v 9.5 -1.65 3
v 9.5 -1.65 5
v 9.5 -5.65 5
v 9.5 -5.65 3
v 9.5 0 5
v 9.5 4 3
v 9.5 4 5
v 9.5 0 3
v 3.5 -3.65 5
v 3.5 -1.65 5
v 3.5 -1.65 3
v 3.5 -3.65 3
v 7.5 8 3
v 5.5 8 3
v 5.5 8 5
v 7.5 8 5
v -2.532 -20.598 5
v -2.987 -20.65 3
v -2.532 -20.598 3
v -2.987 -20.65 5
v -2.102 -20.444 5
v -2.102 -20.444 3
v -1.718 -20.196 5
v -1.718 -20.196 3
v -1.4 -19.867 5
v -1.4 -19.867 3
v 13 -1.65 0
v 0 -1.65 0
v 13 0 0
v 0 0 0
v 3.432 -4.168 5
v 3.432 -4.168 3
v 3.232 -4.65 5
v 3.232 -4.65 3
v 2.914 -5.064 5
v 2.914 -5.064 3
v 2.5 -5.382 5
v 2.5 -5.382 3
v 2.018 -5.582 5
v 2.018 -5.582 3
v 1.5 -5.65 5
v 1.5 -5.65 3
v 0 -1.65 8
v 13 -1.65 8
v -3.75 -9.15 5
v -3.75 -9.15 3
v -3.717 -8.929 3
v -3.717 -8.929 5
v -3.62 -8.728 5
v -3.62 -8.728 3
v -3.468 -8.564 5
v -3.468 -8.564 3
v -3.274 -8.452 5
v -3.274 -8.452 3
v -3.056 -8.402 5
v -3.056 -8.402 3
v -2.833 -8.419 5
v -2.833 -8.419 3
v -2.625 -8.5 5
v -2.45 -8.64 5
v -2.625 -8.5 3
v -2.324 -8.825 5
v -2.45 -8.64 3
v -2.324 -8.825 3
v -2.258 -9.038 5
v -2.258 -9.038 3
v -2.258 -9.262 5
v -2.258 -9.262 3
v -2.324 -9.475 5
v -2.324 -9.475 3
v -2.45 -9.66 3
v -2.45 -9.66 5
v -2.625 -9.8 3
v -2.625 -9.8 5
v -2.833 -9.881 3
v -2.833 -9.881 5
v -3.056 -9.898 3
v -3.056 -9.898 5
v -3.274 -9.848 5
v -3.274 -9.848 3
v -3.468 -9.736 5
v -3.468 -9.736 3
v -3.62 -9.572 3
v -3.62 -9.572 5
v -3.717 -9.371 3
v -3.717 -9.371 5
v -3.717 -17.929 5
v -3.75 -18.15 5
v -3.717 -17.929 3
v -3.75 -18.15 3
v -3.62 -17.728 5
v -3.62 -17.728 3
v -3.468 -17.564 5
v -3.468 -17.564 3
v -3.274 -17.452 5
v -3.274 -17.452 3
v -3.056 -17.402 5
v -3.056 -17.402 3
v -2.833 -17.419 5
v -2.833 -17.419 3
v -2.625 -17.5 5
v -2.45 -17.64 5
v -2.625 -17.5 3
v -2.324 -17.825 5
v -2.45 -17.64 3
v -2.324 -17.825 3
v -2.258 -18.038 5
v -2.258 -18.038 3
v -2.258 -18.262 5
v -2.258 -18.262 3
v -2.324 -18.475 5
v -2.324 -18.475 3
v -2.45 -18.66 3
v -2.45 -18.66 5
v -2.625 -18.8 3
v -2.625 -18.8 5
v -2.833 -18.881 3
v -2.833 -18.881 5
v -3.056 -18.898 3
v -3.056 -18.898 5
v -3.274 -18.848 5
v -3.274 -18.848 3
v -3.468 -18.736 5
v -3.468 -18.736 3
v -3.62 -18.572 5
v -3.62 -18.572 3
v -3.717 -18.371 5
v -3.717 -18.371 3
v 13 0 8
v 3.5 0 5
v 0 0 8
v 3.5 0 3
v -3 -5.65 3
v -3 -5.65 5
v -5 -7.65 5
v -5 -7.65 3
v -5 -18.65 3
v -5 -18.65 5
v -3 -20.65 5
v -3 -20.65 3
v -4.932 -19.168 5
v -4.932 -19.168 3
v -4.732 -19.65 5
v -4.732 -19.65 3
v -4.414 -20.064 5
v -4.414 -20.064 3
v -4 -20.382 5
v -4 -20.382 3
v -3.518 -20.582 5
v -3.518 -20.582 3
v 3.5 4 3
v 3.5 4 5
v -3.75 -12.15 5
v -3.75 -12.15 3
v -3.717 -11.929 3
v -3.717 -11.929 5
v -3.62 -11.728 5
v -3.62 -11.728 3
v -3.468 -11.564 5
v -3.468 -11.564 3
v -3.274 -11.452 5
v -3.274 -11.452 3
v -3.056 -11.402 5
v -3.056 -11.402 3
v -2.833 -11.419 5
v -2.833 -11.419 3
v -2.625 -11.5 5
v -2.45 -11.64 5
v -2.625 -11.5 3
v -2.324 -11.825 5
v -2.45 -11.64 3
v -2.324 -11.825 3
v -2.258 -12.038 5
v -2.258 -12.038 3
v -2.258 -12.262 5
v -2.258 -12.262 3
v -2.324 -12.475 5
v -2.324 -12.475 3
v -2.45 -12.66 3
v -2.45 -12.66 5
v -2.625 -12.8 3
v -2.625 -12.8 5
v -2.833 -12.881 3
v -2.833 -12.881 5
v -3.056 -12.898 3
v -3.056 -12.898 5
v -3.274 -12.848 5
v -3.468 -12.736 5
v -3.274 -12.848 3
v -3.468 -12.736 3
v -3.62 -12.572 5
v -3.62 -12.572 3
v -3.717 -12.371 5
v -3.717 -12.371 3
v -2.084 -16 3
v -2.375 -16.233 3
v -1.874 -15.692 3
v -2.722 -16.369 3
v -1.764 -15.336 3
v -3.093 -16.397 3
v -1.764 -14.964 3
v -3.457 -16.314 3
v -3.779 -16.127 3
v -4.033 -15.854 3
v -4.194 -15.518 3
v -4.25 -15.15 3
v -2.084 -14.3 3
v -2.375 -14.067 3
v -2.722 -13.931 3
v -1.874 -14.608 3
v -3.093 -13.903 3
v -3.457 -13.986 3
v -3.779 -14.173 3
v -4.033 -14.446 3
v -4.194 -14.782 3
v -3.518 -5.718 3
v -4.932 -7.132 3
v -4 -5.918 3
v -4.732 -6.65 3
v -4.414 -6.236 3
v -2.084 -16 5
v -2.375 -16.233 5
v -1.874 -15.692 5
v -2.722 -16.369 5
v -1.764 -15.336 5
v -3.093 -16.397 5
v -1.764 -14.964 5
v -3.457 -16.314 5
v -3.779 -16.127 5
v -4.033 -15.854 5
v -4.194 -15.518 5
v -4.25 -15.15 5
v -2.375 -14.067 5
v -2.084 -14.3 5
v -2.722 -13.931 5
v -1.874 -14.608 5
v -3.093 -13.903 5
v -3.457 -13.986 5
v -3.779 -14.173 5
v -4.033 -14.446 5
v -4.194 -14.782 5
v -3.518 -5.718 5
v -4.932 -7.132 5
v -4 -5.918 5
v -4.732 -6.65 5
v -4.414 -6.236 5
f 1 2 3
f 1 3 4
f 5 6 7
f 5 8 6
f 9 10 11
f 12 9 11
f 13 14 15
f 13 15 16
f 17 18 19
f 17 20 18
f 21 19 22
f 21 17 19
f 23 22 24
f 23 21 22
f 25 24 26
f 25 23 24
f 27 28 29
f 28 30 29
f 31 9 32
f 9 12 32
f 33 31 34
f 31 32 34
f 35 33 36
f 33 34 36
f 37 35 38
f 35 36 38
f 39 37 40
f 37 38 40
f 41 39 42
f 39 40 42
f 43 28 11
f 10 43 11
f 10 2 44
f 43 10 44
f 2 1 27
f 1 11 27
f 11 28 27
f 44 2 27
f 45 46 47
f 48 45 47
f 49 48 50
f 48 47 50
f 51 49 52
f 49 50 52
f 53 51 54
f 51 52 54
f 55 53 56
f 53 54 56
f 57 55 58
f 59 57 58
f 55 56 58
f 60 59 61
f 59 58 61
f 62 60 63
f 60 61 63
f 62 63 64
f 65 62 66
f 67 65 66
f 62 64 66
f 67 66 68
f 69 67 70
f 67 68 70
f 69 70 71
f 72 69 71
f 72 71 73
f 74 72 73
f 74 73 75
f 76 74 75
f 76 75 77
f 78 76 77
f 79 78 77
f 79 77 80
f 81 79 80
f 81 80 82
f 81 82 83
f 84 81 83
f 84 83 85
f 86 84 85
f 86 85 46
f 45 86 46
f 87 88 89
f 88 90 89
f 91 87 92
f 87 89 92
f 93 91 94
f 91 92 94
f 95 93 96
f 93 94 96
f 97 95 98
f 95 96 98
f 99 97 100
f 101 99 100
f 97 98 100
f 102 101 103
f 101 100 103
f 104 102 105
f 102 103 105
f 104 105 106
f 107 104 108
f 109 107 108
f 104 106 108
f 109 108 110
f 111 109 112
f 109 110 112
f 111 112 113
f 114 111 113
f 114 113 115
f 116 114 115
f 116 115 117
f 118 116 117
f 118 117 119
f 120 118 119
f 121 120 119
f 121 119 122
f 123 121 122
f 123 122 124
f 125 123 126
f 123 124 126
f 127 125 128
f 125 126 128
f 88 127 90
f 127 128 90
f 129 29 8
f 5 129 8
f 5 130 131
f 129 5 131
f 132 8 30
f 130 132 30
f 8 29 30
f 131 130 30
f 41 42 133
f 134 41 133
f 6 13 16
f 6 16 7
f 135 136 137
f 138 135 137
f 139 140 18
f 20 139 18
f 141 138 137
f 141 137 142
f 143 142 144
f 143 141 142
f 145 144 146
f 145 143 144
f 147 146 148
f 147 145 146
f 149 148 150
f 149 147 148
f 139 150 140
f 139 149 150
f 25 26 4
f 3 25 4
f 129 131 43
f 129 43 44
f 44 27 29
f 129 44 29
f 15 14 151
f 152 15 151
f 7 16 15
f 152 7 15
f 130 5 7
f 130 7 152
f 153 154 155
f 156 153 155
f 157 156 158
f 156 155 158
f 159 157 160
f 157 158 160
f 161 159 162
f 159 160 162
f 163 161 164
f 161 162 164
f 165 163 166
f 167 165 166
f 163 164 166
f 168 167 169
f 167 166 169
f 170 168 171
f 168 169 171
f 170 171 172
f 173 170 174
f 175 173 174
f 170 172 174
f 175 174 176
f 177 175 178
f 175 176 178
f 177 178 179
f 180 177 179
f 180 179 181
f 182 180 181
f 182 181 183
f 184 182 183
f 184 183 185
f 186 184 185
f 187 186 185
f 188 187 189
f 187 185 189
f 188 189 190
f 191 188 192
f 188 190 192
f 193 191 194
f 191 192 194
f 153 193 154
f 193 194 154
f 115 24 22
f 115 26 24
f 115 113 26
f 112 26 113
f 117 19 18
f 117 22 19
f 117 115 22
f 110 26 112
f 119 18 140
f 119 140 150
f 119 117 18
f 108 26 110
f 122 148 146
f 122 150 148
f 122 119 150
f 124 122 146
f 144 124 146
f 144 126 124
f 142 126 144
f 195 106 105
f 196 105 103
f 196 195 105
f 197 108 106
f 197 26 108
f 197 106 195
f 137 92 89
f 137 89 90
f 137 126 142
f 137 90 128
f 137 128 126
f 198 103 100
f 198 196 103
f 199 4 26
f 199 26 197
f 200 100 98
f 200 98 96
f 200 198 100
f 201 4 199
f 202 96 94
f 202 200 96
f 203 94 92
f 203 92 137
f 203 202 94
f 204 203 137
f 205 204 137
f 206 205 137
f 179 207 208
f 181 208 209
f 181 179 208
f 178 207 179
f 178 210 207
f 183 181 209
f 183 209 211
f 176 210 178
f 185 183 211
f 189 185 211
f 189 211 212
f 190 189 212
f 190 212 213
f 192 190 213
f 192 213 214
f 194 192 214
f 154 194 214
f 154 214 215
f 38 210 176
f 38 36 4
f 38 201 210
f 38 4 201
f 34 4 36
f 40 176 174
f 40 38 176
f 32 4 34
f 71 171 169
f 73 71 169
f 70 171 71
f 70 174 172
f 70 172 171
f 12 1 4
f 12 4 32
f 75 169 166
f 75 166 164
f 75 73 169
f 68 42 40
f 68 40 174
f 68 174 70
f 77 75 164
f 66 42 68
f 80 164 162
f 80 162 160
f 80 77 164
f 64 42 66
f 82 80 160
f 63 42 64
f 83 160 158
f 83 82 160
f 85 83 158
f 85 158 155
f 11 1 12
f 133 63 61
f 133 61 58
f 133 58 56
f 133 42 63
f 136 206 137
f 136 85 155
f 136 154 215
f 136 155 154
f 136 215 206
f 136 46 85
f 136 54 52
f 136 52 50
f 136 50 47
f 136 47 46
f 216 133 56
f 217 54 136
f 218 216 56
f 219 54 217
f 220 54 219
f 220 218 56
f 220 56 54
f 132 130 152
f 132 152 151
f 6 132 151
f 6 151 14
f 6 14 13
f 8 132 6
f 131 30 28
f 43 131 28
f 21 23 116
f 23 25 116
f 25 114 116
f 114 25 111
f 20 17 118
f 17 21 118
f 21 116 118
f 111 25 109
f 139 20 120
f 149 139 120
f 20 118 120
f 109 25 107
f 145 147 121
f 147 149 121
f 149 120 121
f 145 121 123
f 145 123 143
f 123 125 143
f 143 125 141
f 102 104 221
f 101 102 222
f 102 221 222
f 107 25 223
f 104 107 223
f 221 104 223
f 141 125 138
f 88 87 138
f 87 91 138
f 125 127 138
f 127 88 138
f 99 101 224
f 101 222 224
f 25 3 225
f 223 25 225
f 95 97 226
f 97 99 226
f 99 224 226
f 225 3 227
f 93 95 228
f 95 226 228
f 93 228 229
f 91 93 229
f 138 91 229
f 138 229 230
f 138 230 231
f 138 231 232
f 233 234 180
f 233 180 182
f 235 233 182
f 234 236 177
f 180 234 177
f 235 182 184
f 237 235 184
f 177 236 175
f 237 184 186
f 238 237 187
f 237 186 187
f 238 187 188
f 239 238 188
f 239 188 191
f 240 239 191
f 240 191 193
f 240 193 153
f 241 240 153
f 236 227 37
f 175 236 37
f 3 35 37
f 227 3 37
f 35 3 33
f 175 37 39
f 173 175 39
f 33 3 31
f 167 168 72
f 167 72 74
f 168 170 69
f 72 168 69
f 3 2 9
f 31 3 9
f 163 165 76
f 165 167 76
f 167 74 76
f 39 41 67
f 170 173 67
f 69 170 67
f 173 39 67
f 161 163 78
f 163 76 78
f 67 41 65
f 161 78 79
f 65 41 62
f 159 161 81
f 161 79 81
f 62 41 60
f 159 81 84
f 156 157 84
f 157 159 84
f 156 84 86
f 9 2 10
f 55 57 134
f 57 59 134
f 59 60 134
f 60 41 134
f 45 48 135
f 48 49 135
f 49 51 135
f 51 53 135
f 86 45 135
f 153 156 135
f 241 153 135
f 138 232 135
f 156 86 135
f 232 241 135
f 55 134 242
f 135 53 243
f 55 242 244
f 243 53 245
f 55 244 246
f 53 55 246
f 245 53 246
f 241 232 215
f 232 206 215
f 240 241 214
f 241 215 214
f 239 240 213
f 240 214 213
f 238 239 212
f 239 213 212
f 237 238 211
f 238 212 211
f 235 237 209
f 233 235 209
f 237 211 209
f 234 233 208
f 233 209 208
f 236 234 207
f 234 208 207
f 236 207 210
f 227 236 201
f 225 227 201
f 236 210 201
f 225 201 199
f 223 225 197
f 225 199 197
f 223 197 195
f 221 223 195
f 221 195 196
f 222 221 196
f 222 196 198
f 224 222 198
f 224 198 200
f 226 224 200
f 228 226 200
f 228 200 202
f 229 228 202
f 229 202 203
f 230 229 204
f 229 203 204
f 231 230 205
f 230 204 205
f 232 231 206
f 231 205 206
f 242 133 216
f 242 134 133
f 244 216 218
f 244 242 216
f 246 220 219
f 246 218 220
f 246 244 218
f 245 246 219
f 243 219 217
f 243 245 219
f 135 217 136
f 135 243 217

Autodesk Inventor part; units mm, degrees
ref_plane "YZ Plane" through (0, 0, 0) normal (1, 0, 0) x (0, 1, 0)
ref_plane "XZ Plane" through (0, 0, 0) normal (0, 1, 0) x (-1, 0, 0)
ref_plane "XY Plane" through (0, 0, 0) normal (0, 0, 1) x (1, 0, 0)
sketch "Sketch1" plane through (0, 0, 0) normal (0, 0, 1) x (1, 0, 0)
  line L0 (0, 0) -> (0, -1.65)
  line L1 (0, -1.65) -> (13, -1.65)
  line L2 (13, -1.65) -> (13, 0)
  line L3 (13, 0) -> (0, 0)
  dimension "d1" = 1.65
  dimension "d2" = 13
extrude "Extrusion1" add sketch "Sketch1" along normal blind 8
sketch "Sketch3" plane through (0, 0, 0) normal (0, 1, 0) x (1, 0, 0)
  line L0 (0, 0) -> (13, 0) projected
  line L1 (0, -8) -> (13, -8) projected
  line L2 (0, 0) -> (0, -8) projected
  line L3 (0, 0) -> (0, -3)
  line L4 (0, -8) -> (0, -5)
  line L5 (13, 0) -> (13, -3)
  line L6 (13, 0) -> (13, -8) projected
  line L7 (13, -8) -> (13, -5)
  line L8 (3.5, -3) -> (9.5, -3)
  line L9 (9.5, -3) -> (9.5, -5)
  line L10 (9.5, -5) -> (3.5, -5)
  line L11 (3.5, -5) -> (3.5, -3)
  dimension "d9" = 3
  dimension "d10" = 3
  dimension "d13" = 3.5
  dimension "d14" = 3.5
extrude "Extrusion2" add sketch "Sketch3" along normal blind 8 contours L8 L9 L10 L11
sketch "Sketch4" plane through (0, -1.65, 0) normal (0, -1, 0) x (1, 0, 0)
  line L0 (13, 8) -> (0, 8) projected
  line L1 (13, 0) -> (13, 8) projected
  line L2 (13, 8) -> (13, 5)
  line L3 (13, 5) -> (13, 3)
  line L4 (9.5, 5) -> (3.5, 5) projected
  line L5 (3.5, 5) -> (3.5, 3) projected
  line L6 (3.5, 5) -> (9.5, 5)
  line L7 (9.5, 5) -> (9.5, 3)
  line L8 (9.5, 3) -> (3.5, 3)
  line L9 (3.5, 3) -> (3.5, 5)
extrude "Extrusion3" add sketch "Sketch4" along normal blind 4
sketch "Sketch6" plane through (9.5, -1.65, 3) normal (0, 0, -1) x (-1, 0, 0)
  line L0 (0, -4) -> (6, -4) projected
  line L1 (6, -4) -> (14.5, -4)
  line L2 (14.5, -4) -> (14.5, -19)
  line L3 (14.5, -19) -> (11.5, -19)
  line L4 (11.5, -19) -> (0, -4)
  point P0 (9.5, 1.65)
  dimension "d22" = 8.5
  dimension "d23" = 15
  dimension "d24" = 3
extrude "Extrusion4" add sketch "Sketch6" against normal blind 2
sketch "Sketch7" plane through (9.5, -1.65, 3) normal (0, 0, -1) x (-1, 0, 0)
  line L0 (6, -4) -> (14.5, -4) projected
  line L1 (14.5, -19) -> (12.5, -19)
  line L2 (14.5, -19) -> (11.5, -19) projected
  line L3 (12.5, -4) -> (12.5, -6.5)
  line L4 (12.5, -19) -> (12.5, -16.5)
  circle A0 centre (12.5, -16.5) radius 0.75
  line L5 (12.5, -16.5) -> (12.5, -13.5)
  circle A1 centre (12.5, -13.5) radius 1.25
  line L6 (12.5, -13.5) -> (12.5, -10.5)
  circle A2 centre (12.5, -10.5) radius 0.75
  line L7 (12.5, -10.5) -> (12.5, -7.5)
  circle A3 centre (12.5, -7.5) radius 0.75
  point P0 (9.5, 1.65)
  dimension "d31" = 2
  dimension "d45" = 2.5
  dimension "d46" = 2.5
  dimension "d47" = 1.5
  dimension "d48" = 3
  dimension "d49" = 2.5
  dimension "d50" = 3
  dimension "d51" = 1.5
  dimension "d52" = 3
  dimension "d53" = 1.5
fillet "Fillet1" radius 2 1 edges at (3.5, -5.65, 4)
fillet "Fillet2" radius 2 2 edges at (-2, -20.65, 4) (-5, -20.65, 4)
fillet "Fillet3" radius 2 1 edges at (-5, -5.65, 4)
extrude "Extrusion6" cut sketch "Sketch7" against normal blind 2
sketch "Sketch8" plane through (9.5, -1.65, 3) normal (0, 0, -1) x (-1, 0, 0)
  line L0 (0, 1.65) -> (0, 9.65) projected
  line L1 (0, 1.65) -> (0, 5.65)
  line L2 (0, 9.65) -> (2, 9.65)
  line L3 (6, 9.65) -> (4, 9.65)
  line L4 (6, 9.65) -> (0, 9.65) projected
  line L5 (-3.5, 1.65) -> (9.5, 1.65) projected
  line L6 (6, 1.65) -> (6, 5.65)
  line L7 (0, 9.65) -> (2, 9.65)
  line L8 (2, 9.65) -> (0, 5.65)
  line L9 (0, 5.65) -> (0, 9.65)
  line L10 (4, 9.65) -> (6, 5.65)
  line L11 (6, 1.65) -> (6, 9.65) projected
  line L12 (6, 9.65) -> (6, 5.65)
  line L13 (4, 9.65) -> (6, 9.65)
  dimension "d59" = 4
  dimension "d60" = 2
  dimension "d61" = 2
extrude "Extrusion7" cut sketch "Sketch8" against normal blind 10 contours L0 L2 L8 | L10 L3 L11
properties part number "Control Horn"
